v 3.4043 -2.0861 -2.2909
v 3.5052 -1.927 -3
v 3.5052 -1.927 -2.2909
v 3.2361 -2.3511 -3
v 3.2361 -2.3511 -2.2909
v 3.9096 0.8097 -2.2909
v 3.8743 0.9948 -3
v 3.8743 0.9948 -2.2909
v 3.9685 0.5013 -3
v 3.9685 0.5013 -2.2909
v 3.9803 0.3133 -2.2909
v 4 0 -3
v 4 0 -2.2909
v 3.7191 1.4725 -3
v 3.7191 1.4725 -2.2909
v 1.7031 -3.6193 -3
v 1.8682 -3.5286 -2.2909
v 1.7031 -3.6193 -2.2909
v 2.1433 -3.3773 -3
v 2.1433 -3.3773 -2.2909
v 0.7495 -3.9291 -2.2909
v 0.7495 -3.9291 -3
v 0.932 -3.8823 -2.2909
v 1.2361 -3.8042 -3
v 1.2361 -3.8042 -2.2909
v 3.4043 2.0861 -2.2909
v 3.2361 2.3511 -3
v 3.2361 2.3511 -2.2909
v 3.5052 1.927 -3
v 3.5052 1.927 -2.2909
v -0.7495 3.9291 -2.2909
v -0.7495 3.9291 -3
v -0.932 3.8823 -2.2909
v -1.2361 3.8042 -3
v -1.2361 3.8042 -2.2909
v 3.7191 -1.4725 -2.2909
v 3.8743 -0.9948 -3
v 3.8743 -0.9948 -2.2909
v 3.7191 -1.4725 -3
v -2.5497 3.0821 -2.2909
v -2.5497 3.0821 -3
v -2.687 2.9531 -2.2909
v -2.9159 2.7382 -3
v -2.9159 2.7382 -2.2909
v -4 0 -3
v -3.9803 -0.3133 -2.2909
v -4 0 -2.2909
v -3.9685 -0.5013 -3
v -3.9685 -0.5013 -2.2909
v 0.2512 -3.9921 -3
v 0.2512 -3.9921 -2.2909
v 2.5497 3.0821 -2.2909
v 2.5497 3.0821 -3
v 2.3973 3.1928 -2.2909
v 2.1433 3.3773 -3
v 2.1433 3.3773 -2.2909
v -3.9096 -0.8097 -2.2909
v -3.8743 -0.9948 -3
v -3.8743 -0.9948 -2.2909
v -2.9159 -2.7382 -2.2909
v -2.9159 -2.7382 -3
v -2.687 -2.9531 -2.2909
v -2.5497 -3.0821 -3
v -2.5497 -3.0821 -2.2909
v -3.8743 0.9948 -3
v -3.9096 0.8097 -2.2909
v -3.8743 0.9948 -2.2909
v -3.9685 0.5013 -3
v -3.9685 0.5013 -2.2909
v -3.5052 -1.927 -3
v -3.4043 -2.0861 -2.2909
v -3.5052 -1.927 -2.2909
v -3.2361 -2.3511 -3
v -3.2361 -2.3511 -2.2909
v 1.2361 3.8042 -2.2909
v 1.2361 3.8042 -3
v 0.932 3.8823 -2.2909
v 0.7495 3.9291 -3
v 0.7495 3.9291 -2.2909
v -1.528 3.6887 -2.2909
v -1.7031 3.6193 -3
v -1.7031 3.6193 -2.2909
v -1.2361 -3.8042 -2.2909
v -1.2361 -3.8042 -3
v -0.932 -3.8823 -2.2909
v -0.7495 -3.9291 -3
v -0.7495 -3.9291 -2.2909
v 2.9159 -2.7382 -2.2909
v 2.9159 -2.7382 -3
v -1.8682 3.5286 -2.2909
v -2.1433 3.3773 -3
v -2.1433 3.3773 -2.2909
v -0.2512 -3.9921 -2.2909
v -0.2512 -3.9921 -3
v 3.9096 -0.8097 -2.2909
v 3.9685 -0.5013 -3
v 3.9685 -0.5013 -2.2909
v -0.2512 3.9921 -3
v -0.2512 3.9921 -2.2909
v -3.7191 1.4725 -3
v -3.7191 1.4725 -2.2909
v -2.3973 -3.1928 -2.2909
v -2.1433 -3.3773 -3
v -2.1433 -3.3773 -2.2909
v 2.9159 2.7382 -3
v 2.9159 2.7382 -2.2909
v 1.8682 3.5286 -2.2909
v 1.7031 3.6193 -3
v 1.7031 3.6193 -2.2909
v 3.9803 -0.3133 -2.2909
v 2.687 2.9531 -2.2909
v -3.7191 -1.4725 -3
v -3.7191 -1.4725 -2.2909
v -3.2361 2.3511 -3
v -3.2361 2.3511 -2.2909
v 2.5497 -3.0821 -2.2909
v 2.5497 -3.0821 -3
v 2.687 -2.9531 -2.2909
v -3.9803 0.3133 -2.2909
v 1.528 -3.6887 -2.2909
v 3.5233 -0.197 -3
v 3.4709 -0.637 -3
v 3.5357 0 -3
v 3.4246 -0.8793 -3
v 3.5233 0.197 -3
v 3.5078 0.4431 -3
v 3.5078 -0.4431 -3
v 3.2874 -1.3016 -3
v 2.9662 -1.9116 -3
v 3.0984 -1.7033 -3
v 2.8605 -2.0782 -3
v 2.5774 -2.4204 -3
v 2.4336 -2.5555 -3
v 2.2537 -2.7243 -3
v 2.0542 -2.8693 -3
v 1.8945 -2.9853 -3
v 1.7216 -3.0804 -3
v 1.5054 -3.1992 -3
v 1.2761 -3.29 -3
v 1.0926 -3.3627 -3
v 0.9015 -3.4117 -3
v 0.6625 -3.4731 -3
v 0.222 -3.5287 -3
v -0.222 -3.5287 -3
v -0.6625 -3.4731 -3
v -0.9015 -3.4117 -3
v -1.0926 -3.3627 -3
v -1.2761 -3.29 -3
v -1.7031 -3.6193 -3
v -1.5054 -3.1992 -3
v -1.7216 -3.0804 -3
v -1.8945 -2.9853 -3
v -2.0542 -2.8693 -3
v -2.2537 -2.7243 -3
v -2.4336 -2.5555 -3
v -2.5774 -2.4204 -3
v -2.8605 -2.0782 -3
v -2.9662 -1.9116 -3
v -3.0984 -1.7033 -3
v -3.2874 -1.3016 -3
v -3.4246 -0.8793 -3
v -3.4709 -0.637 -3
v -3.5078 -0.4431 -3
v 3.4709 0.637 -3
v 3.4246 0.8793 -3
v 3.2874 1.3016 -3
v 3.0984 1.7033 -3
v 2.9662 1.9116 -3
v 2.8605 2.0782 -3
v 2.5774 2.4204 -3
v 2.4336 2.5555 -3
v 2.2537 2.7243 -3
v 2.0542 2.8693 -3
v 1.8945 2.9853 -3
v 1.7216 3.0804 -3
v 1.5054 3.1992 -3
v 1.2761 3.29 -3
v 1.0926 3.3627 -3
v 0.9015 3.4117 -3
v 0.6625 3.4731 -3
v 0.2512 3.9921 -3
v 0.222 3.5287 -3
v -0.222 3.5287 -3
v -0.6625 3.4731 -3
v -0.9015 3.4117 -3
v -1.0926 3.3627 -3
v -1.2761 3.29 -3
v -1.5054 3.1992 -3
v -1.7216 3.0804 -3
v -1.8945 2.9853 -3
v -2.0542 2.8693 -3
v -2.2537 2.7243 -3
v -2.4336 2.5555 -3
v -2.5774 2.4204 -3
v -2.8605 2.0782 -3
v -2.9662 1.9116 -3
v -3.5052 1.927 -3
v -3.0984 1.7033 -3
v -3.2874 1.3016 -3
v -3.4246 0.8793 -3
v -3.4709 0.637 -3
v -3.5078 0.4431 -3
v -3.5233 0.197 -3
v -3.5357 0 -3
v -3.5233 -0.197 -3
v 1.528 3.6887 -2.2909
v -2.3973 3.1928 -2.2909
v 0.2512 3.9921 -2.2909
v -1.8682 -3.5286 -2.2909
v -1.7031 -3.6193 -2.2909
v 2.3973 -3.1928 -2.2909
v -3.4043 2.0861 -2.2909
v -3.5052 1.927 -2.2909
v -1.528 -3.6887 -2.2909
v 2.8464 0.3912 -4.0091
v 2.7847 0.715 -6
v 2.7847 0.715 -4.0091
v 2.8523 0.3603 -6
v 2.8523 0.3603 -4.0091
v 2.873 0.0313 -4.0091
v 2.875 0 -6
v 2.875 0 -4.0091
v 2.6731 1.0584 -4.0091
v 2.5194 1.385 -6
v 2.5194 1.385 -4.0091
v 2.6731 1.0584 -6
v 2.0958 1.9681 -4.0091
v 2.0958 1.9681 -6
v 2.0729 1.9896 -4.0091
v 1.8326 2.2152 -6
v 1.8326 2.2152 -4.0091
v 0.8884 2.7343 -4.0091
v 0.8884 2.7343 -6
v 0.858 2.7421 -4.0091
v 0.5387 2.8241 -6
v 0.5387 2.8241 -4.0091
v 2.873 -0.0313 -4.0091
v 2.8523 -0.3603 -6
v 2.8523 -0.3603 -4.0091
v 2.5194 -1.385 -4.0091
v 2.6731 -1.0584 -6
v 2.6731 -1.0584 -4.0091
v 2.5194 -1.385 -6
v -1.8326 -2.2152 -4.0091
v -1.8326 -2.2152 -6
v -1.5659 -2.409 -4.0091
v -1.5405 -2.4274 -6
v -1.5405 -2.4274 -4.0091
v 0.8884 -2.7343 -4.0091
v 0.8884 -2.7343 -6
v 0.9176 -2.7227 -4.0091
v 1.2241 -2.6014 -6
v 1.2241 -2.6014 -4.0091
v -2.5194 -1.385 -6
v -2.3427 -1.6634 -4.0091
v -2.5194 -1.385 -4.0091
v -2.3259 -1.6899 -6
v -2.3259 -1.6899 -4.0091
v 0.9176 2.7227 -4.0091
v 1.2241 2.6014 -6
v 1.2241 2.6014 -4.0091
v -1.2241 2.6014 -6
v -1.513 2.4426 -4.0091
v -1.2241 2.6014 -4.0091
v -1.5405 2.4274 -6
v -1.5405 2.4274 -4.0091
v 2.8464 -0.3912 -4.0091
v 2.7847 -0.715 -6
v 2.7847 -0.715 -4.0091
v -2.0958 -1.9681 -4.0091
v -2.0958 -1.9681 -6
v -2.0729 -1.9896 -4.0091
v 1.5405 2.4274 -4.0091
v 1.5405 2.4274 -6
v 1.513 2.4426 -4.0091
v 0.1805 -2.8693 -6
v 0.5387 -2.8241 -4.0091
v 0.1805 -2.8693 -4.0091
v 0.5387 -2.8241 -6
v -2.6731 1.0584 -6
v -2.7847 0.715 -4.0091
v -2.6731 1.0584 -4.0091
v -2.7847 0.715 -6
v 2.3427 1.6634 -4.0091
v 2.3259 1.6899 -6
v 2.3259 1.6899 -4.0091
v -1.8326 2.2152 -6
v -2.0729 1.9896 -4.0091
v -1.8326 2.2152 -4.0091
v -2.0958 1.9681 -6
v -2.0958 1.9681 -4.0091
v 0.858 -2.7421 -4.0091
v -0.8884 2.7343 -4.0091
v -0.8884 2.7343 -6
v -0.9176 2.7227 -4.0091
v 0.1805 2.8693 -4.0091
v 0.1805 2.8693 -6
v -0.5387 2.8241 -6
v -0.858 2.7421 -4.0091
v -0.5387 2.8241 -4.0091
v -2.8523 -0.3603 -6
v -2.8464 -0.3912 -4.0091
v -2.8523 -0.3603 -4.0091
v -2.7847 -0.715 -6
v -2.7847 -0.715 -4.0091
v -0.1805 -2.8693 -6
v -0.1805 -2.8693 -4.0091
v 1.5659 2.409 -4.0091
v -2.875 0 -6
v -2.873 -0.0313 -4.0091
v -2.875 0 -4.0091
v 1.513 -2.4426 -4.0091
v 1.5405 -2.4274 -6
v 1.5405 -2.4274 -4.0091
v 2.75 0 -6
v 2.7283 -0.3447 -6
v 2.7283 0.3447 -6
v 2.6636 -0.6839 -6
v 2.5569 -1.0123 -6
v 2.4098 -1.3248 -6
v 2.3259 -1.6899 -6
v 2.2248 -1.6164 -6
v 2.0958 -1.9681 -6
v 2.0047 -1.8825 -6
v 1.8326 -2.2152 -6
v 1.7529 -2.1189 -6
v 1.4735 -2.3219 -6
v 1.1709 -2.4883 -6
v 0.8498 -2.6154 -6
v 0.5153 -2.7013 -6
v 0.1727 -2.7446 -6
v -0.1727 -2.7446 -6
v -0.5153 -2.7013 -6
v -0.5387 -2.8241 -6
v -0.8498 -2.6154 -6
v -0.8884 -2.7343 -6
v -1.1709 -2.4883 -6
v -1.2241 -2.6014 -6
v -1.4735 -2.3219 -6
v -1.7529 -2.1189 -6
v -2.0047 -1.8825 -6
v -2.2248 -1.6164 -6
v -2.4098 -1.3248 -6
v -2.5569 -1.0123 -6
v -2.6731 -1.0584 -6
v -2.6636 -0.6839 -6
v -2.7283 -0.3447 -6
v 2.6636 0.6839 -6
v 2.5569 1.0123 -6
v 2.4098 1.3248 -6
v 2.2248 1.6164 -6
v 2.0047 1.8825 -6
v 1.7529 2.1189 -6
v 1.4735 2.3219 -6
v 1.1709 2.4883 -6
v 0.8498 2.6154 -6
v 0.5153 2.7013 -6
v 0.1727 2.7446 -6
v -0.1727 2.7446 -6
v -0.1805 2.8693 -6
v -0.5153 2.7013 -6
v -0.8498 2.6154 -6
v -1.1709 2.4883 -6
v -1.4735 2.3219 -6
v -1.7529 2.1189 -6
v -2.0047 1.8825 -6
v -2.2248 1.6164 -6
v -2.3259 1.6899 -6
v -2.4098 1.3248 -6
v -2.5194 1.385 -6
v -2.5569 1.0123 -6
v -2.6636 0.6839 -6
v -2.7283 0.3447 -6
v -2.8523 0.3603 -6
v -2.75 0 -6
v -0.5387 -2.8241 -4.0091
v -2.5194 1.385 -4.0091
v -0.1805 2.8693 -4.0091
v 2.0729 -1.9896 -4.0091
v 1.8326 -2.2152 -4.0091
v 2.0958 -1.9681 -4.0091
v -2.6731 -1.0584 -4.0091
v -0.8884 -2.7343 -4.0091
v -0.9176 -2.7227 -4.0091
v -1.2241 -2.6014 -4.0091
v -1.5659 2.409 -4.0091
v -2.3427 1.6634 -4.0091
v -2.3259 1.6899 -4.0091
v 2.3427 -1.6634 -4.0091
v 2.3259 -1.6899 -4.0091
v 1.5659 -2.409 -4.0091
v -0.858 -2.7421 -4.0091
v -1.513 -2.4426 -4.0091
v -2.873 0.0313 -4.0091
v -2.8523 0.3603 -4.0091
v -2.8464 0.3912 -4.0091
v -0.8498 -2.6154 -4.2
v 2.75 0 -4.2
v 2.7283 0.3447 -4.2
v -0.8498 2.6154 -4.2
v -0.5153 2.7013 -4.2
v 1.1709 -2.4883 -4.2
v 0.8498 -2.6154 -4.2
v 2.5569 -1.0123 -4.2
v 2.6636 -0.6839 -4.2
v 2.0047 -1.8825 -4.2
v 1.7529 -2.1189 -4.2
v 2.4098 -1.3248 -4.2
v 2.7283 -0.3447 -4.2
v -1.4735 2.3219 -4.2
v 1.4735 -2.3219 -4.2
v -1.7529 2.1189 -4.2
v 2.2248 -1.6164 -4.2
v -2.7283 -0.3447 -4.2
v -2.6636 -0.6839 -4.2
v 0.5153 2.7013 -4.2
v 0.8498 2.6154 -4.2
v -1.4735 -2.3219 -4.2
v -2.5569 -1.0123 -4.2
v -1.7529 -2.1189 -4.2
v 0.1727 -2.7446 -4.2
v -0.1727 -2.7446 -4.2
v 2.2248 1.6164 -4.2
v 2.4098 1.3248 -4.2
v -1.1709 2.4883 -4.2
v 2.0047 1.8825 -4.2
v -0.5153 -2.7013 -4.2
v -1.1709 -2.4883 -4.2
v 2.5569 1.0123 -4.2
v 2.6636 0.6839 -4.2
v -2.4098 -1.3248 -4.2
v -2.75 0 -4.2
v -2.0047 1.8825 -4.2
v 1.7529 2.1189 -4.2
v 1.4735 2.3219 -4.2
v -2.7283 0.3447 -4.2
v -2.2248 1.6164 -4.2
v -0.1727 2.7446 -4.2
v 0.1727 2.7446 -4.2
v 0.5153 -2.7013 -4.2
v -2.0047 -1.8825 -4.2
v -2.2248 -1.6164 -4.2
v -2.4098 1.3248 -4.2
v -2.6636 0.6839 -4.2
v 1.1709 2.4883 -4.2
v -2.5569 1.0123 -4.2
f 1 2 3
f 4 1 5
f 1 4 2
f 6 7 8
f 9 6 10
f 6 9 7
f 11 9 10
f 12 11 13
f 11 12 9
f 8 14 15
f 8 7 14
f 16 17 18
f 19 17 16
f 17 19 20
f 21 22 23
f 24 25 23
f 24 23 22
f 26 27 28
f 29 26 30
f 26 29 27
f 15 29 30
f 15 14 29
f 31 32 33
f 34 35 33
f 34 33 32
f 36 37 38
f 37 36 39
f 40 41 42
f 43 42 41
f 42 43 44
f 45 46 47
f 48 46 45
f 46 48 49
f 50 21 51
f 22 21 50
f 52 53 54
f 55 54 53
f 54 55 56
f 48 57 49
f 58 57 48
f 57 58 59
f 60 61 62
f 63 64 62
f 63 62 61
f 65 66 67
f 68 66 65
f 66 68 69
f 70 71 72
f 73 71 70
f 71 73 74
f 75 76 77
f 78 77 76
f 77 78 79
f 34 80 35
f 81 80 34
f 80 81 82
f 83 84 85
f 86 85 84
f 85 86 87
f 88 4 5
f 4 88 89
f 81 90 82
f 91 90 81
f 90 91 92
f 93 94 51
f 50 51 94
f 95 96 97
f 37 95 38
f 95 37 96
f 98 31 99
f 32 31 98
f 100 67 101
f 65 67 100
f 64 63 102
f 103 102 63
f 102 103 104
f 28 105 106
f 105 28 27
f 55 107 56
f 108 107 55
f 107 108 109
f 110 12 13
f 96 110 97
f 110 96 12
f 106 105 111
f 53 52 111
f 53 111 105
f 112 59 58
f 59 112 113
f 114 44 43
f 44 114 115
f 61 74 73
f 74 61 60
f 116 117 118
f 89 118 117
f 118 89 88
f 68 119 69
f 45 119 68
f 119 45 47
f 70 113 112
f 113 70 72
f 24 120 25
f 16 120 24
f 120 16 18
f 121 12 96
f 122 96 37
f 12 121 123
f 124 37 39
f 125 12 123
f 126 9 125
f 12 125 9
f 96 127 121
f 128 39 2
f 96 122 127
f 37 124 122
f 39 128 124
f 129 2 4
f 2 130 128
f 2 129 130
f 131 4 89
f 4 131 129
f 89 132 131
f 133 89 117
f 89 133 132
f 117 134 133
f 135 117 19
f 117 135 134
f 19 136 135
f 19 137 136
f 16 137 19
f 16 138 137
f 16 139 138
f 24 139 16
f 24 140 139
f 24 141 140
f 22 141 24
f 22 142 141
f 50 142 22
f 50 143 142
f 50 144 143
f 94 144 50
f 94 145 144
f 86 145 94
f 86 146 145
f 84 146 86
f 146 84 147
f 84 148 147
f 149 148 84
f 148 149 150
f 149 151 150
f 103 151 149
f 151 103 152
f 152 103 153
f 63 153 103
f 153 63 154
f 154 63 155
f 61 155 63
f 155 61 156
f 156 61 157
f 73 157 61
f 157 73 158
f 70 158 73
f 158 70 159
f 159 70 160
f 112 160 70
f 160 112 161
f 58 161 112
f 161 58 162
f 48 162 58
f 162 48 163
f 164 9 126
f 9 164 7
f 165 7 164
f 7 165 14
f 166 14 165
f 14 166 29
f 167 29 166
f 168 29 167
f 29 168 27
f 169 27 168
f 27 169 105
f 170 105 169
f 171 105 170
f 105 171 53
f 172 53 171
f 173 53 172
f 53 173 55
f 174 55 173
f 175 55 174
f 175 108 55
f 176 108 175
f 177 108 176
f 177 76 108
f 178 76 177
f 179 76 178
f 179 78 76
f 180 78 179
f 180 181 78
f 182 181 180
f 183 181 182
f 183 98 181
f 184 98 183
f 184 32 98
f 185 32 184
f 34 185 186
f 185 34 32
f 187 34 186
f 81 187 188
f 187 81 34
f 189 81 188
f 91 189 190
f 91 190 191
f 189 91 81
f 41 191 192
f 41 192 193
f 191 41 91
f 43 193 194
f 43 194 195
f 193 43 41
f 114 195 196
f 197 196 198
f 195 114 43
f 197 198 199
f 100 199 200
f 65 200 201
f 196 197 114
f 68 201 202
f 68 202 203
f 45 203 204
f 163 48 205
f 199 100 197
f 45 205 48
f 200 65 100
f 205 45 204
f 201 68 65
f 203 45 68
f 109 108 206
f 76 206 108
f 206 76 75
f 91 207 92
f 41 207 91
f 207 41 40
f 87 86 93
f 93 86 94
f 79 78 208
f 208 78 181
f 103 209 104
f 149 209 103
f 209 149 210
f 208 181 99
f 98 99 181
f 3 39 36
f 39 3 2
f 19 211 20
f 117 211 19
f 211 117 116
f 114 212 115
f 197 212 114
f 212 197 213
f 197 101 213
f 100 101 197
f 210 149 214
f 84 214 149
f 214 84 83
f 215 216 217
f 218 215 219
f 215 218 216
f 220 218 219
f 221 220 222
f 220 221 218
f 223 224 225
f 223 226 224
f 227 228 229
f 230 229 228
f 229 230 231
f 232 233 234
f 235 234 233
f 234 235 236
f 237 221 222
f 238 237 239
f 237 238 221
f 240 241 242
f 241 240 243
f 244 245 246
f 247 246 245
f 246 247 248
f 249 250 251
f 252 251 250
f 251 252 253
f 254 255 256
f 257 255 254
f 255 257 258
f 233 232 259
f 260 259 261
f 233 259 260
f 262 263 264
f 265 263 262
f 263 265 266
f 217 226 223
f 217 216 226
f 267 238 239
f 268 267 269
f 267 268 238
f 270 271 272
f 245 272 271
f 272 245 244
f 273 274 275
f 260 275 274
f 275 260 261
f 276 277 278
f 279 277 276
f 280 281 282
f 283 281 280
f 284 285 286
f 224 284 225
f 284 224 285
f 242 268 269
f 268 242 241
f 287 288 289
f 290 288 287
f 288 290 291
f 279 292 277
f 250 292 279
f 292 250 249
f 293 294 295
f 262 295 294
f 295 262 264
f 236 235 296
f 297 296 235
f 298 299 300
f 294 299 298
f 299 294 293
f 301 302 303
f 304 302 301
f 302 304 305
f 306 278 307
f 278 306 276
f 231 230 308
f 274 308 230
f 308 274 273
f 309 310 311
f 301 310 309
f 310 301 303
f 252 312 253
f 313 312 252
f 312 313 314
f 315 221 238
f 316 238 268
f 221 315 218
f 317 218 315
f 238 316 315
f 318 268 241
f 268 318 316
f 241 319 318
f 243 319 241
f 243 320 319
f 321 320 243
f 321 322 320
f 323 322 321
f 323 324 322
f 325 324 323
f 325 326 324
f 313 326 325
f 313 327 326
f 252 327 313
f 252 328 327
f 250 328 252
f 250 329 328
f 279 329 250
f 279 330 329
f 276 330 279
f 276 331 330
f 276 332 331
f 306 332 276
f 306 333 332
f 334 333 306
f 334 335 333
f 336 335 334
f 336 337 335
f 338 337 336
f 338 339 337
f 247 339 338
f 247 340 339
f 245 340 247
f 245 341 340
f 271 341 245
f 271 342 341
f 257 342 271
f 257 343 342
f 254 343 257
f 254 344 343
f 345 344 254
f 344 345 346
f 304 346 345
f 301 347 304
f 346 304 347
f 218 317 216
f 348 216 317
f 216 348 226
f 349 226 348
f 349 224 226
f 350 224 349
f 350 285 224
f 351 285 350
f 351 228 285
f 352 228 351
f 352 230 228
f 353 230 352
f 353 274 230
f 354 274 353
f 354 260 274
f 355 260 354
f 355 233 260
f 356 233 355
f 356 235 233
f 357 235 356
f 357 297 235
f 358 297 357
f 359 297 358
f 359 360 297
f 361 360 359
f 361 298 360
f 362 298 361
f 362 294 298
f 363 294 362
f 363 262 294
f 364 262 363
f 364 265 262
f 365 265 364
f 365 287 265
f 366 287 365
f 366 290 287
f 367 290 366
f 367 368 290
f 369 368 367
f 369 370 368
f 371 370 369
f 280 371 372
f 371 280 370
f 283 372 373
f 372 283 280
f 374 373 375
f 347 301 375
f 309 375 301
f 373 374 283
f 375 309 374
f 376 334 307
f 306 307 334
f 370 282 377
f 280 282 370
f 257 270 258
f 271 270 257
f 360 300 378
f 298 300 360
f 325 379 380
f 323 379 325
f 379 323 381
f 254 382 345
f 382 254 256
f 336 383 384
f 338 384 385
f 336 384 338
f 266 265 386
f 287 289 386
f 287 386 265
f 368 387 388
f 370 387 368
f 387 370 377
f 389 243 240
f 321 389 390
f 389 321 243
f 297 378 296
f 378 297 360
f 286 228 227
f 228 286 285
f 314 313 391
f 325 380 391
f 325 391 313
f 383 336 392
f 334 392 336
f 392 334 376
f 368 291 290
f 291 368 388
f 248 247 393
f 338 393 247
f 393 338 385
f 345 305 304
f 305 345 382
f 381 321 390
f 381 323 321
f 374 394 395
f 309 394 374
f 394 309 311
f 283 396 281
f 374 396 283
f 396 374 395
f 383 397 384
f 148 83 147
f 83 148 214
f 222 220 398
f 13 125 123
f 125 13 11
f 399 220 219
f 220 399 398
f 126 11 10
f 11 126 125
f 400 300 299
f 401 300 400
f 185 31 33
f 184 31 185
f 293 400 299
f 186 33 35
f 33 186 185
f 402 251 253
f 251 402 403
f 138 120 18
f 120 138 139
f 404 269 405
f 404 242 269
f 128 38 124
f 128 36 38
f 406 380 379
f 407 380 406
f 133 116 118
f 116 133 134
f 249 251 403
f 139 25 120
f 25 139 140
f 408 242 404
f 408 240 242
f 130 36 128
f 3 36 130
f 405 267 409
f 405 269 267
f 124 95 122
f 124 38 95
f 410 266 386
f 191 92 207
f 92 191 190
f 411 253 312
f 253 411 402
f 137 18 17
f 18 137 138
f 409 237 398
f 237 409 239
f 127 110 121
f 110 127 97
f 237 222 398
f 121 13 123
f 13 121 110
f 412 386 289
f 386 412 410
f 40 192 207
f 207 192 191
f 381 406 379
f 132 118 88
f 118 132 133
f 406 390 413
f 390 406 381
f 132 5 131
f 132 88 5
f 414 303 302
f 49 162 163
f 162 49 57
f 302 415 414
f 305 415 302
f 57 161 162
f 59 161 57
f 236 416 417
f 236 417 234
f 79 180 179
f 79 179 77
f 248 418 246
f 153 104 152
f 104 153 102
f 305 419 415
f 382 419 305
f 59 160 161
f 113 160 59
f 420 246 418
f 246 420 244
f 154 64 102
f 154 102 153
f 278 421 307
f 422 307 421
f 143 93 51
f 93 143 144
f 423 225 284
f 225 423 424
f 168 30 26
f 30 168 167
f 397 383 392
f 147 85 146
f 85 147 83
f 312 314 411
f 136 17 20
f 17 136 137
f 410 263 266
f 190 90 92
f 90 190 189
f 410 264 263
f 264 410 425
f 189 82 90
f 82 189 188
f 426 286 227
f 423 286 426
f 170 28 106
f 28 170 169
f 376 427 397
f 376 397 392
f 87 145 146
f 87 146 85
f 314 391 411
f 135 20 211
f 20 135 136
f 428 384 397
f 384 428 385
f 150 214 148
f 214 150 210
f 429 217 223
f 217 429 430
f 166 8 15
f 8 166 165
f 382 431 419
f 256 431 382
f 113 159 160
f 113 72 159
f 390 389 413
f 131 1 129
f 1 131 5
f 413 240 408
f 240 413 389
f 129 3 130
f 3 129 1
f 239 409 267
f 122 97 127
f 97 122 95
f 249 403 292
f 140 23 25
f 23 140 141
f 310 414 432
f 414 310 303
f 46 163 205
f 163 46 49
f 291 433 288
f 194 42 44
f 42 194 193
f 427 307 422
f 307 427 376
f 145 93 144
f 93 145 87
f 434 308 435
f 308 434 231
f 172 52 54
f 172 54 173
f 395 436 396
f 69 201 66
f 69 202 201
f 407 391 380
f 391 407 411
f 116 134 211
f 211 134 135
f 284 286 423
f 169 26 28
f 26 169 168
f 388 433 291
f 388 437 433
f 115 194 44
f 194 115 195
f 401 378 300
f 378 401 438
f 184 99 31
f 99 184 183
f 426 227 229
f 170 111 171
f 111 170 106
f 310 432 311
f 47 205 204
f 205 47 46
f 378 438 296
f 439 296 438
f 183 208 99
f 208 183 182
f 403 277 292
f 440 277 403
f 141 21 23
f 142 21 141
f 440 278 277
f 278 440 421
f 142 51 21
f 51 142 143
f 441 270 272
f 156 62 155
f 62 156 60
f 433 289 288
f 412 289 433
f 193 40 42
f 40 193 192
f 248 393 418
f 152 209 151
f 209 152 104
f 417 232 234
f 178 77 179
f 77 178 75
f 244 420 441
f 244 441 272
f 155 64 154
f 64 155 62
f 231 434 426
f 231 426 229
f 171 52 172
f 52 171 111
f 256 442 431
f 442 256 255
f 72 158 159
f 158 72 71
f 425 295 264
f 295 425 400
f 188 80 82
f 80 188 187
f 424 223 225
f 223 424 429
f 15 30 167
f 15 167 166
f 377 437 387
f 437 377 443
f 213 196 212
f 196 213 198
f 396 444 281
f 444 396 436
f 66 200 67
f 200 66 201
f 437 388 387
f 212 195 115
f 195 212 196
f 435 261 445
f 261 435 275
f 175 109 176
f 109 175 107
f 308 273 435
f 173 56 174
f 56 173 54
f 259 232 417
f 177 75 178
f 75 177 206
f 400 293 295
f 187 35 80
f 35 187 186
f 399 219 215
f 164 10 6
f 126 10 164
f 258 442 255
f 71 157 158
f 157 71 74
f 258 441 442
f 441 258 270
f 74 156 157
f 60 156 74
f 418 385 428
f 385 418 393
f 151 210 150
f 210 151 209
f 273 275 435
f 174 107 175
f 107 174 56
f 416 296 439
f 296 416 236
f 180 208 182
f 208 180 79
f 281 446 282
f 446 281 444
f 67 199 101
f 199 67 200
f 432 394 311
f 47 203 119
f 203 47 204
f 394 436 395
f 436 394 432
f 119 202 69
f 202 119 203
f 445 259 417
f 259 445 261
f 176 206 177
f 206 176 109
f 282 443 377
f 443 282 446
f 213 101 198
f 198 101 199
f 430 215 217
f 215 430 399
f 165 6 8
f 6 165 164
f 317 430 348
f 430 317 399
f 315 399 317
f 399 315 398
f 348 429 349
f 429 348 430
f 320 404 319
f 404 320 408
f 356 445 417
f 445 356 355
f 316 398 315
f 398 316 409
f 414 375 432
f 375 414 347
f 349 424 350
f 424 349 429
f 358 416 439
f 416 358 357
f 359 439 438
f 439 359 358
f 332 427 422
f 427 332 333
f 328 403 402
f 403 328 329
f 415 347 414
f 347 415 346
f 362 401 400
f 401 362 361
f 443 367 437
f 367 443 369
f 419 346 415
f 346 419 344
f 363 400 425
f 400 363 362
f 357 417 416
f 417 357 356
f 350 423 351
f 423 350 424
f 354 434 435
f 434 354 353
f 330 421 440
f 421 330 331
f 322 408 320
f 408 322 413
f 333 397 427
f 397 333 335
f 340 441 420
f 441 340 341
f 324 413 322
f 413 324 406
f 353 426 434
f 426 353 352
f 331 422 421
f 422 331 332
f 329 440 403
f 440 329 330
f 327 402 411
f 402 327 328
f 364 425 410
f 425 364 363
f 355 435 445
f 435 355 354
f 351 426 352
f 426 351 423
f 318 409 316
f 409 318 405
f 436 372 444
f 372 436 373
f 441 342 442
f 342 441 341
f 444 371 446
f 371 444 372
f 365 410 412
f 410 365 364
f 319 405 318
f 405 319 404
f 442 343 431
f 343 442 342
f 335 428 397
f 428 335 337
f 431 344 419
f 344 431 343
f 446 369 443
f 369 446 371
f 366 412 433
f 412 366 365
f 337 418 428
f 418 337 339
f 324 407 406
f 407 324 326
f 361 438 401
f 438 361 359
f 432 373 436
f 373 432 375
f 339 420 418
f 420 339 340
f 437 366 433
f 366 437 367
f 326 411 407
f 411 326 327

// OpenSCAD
$fn = 50;

difference() {
	union() {
		translate(v = [0, 0, -3.0]) {
			cylinder(h = 3, r = 4.0);
		}
		#translate(v = [0, 0, -6.0]) {
			cylinder(h = 6, r = 2.875);
		}
	}
	union() {
		translate(v = [0, 0, 0]) {
			rotate(a = [0, 0, 0]) {
				difference() {
					union() {
						translate(v = [0, 0, -6.0]) {
							cylinder(h = 6, r = 2.25);
						}
						translate(v = [0, 0, -4.2]) {
							cylinder(h = 4.2, r1 = 2.75, r2 = 5.5);
						}
						translate(v = [0, 0, -6.0]) {
							cylinder(h = 6, r = 2.75);
						}
						translate(v = [0, 0, -6.0]) {
							cylinder(h = 6, r = 2.25);
						}
					}
					union();
				}
			}
		}
	}
}
